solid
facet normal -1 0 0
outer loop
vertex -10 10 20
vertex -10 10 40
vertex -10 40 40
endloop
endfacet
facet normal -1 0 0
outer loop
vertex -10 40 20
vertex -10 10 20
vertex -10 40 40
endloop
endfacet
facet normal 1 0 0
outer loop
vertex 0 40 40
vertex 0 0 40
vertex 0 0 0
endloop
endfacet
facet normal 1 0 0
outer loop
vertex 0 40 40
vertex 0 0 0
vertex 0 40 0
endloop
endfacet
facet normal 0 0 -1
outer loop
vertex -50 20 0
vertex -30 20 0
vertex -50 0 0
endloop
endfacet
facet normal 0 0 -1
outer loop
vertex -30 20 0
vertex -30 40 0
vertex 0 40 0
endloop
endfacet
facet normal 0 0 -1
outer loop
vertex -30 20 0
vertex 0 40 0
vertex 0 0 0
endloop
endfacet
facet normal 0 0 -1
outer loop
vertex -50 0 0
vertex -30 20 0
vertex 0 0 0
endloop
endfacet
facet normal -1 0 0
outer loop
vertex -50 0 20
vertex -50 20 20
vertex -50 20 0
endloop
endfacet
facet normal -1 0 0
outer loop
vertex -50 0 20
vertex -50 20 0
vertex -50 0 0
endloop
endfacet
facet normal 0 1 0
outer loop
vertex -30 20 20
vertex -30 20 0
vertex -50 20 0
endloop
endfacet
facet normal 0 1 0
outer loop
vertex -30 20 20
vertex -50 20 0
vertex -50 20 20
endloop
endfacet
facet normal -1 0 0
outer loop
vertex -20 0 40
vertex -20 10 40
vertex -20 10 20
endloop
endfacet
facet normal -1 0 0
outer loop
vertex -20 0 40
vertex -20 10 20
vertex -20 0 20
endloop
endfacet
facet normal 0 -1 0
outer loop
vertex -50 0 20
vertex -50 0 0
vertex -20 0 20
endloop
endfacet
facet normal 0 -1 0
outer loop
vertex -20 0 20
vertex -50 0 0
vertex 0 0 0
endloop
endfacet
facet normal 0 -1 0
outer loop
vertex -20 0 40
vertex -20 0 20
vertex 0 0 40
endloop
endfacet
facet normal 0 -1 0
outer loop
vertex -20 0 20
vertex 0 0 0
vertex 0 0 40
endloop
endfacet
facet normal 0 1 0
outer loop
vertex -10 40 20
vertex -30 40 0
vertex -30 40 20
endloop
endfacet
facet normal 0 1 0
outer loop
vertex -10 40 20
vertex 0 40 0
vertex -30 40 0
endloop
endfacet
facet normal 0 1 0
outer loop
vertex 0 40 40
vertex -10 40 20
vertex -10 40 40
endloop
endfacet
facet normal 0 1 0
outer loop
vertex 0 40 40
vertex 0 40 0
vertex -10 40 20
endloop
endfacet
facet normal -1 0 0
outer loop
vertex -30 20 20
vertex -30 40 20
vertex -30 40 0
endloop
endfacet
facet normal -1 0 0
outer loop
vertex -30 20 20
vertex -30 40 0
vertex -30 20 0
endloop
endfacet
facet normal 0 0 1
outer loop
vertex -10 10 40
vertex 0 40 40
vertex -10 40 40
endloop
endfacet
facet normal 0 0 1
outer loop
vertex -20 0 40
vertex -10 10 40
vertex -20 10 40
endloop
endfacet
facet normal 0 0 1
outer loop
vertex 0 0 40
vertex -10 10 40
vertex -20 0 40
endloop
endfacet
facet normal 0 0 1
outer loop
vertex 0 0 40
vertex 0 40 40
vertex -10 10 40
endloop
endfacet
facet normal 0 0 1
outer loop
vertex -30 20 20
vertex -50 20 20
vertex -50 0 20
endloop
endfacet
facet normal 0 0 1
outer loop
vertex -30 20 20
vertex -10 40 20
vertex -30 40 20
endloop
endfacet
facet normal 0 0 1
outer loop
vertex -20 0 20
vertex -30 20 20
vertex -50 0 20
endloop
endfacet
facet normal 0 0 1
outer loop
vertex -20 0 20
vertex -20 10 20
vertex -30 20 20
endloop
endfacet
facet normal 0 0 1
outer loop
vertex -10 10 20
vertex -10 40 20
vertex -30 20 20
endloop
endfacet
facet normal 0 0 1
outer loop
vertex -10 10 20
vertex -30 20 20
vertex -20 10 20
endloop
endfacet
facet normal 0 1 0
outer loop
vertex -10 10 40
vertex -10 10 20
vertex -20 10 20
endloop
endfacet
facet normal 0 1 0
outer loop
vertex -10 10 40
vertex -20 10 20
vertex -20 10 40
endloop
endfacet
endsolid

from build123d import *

# Parameters (mm, degrees)
F0_W     = 40
F0_H     = 40
F1_DEPTH = 10
F2_W     = 40
F2_H     = 20
F3_DEPTH = 20
F4_W     = 20
F4_H     = 20
F5_DEPTH = 20
F6_W     = 10
F6_H     = 20
F7_DEPTH = 10


with BuildPart() as f1:
    # F0 (on Right) → F1 (new body)
    with BuildSketch(Plane.YZ):
        with Locations((20, 20)):
            Rectangle(F0_W, F0_H)
    extrude(amount=-F1_DEPTH)

    # F2 (on face) → F3 (join)
    with BuildSketch(Plane(origin=(-10, 0, 0), x_dir=(0, -1, 0), z_dir=(-1, 0, 0))):
        with Locations((-20, 10)):
            Rectangle(F2_W, F2_H)
    extrude(amount=F3_DEPTH)

    # F4 (on face) → F5 (join)
    with BuildSketch(Plane(origin=(-30, 0, 0), x_dir=(0, -1, 0), z_dir=(-1, 0, 0))):
        with Locations((-10, 10)):
            Rectangle(F4_W, F4_H)
    extrude(amount=F5_DEPTH)

    # F6 (on face) → F7 (join)
    with BuildSketch(Plane(origin=(-10, 0, 0), x_dir=(0, -1, 0), z_dir=(-1, 0, 0))):
        with Locations((-5, 30)):
            Rectangle(F6_W, F6_H)
    extrude(amount=F7_DEPTH)


solid = f1.part
